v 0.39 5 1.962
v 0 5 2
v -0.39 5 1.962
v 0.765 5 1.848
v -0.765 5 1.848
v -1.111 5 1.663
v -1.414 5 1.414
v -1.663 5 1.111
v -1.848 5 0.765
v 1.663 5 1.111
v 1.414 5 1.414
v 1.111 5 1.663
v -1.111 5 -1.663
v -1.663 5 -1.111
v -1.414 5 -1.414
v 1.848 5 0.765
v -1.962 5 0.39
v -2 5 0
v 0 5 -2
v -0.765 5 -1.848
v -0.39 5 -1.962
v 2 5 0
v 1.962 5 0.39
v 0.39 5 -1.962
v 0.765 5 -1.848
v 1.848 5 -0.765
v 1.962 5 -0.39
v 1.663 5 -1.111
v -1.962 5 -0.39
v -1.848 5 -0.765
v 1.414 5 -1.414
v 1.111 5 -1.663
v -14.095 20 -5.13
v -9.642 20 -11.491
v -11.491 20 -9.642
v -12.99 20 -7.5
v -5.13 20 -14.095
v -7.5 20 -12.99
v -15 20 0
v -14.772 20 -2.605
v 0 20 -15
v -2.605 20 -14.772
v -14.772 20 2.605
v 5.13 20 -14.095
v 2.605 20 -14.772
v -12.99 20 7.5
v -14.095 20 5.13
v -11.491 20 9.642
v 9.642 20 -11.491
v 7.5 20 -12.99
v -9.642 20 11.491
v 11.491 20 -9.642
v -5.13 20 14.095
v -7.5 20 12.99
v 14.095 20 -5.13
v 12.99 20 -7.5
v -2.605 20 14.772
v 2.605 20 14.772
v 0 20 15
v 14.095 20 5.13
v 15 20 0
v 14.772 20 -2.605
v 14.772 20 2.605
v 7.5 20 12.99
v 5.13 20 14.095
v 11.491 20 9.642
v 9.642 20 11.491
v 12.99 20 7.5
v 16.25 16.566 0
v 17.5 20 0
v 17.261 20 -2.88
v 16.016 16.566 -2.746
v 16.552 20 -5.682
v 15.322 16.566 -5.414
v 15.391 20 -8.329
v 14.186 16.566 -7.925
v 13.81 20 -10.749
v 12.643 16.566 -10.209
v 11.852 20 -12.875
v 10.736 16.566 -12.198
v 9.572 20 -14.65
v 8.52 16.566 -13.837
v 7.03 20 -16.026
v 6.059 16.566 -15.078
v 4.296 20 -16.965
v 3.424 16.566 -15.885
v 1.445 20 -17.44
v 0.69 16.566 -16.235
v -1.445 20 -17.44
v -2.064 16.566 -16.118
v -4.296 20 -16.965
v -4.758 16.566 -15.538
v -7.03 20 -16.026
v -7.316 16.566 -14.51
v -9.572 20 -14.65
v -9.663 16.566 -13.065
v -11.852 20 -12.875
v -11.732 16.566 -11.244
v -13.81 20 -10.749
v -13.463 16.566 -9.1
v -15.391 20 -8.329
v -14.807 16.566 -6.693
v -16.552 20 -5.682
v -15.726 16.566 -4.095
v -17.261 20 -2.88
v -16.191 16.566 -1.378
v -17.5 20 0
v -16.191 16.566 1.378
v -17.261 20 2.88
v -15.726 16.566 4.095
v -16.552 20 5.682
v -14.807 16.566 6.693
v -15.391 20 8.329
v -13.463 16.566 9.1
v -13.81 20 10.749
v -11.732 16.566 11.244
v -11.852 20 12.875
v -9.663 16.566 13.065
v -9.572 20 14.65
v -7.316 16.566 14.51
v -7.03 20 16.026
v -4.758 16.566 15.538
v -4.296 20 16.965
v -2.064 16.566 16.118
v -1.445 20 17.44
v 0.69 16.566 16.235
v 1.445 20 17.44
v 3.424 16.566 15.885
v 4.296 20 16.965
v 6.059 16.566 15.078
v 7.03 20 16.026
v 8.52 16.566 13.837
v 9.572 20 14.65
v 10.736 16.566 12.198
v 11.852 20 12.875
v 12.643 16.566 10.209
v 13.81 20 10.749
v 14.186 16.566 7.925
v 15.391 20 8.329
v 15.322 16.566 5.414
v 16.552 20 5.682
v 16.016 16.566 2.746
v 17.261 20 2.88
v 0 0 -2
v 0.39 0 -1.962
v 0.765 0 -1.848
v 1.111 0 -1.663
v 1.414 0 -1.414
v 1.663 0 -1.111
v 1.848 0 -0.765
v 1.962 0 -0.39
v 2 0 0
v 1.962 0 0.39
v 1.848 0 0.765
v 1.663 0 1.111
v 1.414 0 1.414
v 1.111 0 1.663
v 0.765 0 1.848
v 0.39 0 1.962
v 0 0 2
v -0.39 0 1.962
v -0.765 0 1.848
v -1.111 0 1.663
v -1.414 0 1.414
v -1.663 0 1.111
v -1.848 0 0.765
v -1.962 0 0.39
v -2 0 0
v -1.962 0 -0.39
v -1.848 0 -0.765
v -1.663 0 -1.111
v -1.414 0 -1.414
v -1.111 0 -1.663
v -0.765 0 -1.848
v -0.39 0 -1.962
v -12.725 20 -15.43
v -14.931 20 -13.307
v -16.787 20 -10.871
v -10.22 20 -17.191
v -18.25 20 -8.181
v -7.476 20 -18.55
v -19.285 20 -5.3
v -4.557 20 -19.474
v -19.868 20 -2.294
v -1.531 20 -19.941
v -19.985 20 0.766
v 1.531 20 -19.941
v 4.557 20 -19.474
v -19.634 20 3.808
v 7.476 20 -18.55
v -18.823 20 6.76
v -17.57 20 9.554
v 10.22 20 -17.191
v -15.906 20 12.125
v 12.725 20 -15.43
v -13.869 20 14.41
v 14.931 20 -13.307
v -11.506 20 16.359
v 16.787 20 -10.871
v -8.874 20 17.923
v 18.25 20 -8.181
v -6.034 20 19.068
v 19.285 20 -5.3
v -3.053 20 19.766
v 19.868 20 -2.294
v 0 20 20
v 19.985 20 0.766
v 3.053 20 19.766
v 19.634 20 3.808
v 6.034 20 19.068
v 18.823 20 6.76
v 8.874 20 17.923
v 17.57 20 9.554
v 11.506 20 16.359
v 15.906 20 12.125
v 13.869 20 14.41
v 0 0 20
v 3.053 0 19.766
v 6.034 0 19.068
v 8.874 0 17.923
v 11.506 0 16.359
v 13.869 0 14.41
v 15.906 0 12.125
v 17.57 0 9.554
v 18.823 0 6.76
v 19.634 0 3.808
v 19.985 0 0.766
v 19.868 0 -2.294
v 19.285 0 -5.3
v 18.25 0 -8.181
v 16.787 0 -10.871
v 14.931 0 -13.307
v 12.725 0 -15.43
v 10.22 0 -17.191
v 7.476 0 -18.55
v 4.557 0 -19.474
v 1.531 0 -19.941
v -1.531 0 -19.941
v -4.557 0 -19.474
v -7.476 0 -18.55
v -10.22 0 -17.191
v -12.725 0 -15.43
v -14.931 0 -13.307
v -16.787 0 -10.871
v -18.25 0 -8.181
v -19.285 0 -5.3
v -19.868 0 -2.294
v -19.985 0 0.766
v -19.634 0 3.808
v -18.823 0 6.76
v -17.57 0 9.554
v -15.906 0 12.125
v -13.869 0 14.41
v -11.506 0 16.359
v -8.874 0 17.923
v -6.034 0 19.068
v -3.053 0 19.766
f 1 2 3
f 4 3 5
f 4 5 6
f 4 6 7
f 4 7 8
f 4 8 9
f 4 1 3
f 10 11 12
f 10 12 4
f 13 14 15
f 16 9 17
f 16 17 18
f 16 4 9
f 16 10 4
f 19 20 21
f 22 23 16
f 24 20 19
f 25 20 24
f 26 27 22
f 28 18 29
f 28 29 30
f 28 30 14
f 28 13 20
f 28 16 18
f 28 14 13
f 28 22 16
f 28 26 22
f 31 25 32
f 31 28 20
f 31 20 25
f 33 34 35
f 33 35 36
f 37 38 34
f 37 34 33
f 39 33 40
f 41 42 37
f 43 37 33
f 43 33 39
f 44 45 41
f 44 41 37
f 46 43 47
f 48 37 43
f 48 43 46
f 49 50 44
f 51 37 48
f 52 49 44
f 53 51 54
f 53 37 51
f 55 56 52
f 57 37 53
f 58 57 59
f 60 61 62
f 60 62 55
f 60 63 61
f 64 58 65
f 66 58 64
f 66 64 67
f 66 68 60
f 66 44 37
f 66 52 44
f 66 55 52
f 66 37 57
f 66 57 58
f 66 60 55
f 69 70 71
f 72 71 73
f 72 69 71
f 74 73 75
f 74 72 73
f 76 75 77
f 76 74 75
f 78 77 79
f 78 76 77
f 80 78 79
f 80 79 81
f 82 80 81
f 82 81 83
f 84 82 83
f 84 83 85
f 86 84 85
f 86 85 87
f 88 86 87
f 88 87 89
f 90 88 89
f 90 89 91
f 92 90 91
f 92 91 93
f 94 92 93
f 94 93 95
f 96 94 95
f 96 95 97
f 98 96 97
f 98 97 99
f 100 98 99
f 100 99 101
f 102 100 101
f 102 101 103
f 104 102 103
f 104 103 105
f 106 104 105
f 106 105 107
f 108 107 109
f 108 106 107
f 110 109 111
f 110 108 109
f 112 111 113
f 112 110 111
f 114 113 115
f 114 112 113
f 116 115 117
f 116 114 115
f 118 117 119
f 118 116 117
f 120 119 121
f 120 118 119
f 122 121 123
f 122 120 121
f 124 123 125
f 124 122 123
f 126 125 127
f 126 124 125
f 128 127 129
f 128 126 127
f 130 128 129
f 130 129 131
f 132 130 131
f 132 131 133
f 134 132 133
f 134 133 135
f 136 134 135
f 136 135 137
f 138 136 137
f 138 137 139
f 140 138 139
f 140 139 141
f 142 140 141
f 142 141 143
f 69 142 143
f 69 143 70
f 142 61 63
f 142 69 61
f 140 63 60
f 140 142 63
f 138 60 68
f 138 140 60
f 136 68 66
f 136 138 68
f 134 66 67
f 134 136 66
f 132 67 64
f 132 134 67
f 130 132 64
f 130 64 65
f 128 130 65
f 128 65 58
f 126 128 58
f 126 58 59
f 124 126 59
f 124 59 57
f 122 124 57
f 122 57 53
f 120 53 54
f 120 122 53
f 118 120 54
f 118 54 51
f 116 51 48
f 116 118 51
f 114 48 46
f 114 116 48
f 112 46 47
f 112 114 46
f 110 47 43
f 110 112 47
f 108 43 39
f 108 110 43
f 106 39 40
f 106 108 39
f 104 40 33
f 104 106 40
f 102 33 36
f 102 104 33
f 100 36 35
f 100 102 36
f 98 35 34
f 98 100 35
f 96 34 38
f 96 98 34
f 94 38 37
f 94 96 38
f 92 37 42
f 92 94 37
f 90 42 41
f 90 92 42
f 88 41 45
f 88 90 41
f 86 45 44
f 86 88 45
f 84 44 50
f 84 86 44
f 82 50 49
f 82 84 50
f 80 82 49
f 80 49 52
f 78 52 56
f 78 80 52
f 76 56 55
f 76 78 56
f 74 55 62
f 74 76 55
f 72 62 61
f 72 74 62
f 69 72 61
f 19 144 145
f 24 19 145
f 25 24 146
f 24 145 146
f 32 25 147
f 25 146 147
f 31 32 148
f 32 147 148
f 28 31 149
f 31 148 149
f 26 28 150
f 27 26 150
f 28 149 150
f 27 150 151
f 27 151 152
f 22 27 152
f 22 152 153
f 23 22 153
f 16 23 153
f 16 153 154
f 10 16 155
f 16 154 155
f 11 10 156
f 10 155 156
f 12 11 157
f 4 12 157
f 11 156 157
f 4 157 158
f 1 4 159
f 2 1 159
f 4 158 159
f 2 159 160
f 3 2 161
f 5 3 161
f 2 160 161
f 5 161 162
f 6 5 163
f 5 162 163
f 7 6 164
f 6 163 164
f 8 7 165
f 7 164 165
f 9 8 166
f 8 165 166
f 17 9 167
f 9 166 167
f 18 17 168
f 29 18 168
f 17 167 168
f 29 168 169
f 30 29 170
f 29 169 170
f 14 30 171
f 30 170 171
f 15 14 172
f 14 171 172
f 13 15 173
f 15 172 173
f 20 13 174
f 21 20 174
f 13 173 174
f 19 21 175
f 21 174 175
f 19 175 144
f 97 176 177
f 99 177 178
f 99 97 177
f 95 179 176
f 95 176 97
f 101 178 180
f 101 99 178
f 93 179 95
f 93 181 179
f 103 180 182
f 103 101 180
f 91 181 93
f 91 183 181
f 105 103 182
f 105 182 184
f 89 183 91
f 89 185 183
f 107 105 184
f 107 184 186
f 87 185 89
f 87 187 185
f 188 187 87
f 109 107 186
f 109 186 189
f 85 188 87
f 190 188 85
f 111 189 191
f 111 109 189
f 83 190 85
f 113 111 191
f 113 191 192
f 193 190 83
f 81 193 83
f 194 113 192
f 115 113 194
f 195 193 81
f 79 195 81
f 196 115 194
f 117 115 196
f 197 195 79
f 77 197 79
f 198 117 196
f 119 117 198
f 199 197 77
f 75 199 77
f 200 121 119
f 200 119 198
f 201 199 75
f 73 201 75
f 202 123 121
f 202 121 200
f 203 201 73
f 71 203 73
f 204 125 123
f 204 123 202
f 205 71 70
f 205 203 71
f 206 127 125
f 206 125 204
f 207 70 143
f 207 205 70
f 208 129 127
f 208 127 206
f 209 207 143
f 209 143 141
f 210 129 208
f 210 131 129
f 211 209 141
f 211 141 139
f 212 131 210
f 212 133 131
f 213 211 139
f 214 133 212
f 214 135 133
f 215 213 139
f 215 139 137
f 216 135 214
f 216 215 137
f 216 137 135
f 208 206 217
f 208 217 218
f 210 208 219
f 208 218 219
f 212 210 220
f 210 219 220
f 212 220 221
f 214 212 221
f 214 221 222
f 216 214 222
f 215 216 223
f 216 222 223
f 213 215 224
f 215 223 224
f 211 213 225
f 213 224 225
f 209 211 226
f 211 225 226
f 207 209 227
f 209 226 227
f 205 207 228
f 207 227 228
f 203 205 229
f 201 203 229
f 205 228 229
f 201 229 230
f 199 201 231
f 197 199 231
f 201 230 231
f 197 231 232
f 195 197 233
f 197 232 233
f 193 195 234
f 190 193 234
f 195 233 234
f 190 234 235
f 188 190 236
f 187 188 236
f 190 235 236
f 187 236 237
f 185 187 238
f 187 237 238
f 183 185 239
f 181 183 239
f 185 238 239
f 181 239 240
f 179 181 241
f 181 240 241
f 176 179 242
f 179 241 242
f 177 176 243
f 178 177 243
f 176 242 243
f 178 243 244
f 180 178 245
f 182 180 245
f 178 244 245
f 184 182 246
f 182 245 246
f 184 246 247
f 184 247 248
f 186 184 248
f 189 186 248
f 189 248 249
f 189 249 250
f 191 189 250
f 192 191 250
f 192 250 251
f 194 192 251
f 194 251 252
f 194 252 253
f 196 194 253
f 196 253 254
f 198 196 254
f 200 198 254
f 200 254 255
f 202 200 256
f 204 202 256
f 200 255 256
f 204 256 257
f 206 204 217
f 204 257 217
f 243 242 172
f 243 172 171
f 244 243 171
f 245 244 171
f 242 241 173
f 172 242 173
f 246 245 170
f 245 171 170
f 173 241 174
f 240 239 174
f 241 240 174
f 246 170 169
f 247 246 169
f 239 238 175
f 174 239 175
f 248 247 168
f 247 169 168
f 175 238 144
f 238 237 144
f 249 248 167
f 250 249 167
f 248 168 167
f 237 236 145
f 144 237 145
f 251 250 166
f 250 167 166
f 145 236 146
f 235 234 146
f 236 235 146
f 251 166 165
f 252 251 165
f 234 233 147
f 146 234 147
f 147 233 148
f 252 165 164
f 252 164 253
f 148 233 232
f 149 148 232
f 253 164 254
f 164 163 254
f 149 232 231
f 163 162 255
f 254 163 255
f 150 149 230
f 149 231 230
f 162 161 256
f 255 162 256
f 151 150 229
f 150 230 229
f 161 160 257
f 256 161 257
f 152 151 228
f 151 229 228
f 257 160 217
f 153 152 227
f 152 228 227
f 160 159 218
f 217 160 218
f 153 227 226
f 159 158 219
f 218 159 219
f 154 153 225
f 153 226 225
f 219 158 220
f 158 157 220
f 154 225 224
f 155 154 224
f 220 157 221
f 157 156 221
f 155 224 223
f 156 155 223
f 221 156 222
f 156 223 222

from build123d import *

# Parameters (mm, degrees)
SKETCH1_R           = 20
BOSS_EXTRUDE1_DEPTH = 20
SKETCH2_R           = 17.5
SKETCH2_R_2         = 15
CUT_EXTRUDE1_DEPTH  = 10
CUT_EXTRUDE1_TAPER  = 20
SKETCH3_R           = 2
CUT_EXTRUDE2_DEPTH  = 5


with BuildPart() as part:
    # Sketch1 → Boss-Extrude1 (new body)
    with BuildSketch(Plane(origin=(0, 0, 0), x_dir=(1, 0, 0), z_dir=(0, 1, 0))):
        with Locations(Location((0, 0, 0), (0, 0, 270))):
            Circle(SKETCH1_R)
    extrude(amount=BOSS_EXTRUDE1_DEPTH)

    # Sketch2 → Cut-Extrude1 (cut)
    with BuildSketch(Plane(origin=(0, 20, 0), x_dir=(1, 0, 0), z_dir=(0, 1, 0))):
        Circle(SKETCH2_R)
        Circle(SKETCH2_R_2, mode=Mode.SUBTRACT)
    extrude(amount=-CUT_EXTRUDE1_DEPTH, taper=CUT_EXTRUDE1_TAPER, mode=Mode.SUBTRACT)

    # Sketch3 → Cut-Extrude2 (cut)
    with BuildSketch(Plane.XZ):
        with Locations(Location((0, 0, 0), (0, 0, 270))):
            Circle(SKETCH3_R)
    extrude(amount=-CUT_EXTRUDE2_DEPTH, mode=Mode.SUBTRACT)


solid = part.part
